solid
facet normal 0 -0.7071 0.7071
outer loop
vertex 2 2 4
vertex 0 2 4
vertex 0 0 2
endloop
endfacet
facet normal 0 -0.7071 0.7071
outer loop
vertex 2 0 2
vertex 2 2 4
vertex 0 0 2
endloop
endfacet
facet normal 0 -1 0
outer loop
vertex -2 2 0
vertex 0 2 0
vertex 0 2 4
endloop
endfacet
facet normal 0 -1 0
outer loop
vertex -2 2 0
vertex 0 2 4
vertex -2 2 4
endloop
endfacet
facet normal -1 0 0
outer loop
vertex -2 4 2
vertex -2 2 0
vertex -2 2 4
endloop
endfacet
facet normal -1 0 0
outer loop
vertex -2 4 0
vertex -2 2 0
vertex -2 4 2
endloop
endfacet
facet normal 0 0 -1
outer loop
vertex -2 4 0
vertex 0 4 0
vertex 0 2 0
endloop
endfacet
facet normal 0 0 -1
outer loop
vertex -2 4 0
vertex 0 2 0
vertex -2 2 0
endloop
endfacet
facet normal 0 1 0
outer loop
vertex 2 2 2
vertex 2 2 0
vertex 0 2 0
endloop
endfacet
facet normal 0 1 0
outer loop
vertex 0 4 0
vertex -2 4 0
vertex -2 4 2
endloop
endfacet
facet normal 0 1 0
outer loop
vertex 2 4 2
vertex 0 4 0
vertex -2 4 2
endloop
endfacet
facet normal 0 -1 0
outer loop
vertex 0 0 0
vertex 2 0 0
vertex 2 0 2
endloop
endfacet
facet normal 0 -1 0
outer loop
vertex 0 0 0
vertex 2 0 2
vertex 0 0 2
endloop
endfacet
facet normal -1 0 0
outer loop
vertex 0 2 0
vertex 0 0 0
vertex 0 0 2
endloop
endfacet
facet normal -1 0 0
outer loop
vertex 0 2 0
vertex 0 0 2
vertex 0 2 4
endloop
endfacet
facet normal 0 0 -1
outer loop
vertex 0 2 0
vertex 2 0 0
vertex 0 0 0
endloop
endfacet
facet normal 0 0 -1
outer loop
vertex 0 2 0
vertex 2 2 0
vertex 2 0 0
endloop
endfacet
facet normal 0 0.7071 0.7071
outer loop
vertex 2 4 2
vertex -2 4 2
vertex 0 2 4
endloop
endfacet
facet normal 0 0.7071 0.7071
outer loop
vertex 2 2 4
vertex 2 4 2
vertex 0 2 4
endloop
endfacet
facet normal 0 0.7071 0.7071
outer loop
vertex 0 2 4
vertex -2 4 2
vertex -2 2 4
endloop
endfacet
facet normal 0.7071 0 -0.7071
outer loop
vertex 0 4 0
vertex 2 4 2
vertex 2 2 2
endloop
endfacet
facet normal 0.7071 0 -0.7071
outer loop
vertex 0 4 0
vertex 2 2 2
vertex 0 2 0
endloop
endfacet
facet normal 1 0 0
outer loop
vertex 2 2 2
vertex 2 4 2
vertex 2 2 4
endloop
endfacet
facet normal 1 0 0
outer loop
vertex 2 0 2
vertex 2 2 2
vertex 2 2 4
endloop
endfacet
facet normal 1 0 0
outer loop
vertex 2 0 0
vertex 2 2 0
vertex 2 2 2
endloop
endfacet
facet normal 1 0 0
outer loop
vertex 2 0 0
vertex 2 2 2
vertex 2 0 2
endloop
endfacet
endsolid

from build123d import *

# Parameters (mm, degrees)
BOSS_EXTRUDE1_DEPTH = 4
CUT_EXTRUDE1_DEPTH  = 4
CUT_EXTRUDE2_DEPTH  = 2


with BuildPart() as part:
    # Sketch1 → Boss-Extrude1 (new body)
    with BuildSketch(Plane.XY):
        Polygon((0, 0), (0, 2), (-2, 2), (-2, 4), (2, 4), (2, 0), align=None)
    extrude(amount=BOSS_EXTRUDE1_DEPTH)

    # Sketch2 → Cut-Extrude1 (cut)
    with BuildSketch(Plane.ZY.offset(2)):
        Polygon((4, 4), (2, 4), (4, 2), align=None)
        Polygon((4, 0), (4, 2), (2, 0), align=None)
    extrude(amount=-CUT_EXTRUDE1_DEPTH, mode=Mode.SUBTRACT)

    # Sketch3 → Cut-Extrude2 (cut)
    with BuildSketch(Plane(origin=(0, 4, 0), x_dir=(1, 0, 0), z_dir=(0, 1, 0))):
        Polygon((2, -2), (0, 0), (2, 0), align=None)
    extrude(amount=-CUT_EXTRUDE2_DEPTH, mode=Mode.SUBTRACT)


solid = part.part
